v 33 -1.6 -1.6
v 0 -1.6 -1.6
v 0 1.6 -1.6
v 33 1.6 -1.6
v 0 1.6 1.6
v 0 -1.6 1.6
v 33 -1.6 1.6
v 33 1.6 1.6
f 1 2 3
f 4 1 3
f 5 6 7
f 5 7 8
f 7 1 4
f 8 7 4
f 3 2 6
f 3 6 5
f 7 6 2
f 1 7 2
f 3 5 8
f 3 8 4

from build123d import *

# Parameters (mm, degrees)
SKETCH2_W             = 3.2
SKETCH2_H             = 3.2
BOSS_EXTRUDE1_DEPTH   = 33
BODY_MOVE_COPY1_ANGLE = 90


with BuildPart() as part:
    # Sketch2 → Boss-Extrude1 (new body)
    with BuildSketch(Plane(origin=(0, 0, 0), x_dir=(1, 0, 0), z_dir=(0, 1, 0))):
        Rectangle(SKETCH2_W, SKETCH2_H)
    extrude(amount=BOSS_EXTRUDE1_DEPTH)


with BuildPart() as part_1:
    # Body-Move/Copy1: moved
    add(part.part.rotate(Axis((0, 33, 0), (0, 0, 1)), BODY_MOVE_COPY1_ANGLE))


with BuildPart() as part_2:
    # Body-Move/Copy3: read off the stored shape, not the designer's step
    # Body-Move/Copy3: moved
    add(part_1.part.moved(Location((0, -33, 0))))


solid = part_2.part
